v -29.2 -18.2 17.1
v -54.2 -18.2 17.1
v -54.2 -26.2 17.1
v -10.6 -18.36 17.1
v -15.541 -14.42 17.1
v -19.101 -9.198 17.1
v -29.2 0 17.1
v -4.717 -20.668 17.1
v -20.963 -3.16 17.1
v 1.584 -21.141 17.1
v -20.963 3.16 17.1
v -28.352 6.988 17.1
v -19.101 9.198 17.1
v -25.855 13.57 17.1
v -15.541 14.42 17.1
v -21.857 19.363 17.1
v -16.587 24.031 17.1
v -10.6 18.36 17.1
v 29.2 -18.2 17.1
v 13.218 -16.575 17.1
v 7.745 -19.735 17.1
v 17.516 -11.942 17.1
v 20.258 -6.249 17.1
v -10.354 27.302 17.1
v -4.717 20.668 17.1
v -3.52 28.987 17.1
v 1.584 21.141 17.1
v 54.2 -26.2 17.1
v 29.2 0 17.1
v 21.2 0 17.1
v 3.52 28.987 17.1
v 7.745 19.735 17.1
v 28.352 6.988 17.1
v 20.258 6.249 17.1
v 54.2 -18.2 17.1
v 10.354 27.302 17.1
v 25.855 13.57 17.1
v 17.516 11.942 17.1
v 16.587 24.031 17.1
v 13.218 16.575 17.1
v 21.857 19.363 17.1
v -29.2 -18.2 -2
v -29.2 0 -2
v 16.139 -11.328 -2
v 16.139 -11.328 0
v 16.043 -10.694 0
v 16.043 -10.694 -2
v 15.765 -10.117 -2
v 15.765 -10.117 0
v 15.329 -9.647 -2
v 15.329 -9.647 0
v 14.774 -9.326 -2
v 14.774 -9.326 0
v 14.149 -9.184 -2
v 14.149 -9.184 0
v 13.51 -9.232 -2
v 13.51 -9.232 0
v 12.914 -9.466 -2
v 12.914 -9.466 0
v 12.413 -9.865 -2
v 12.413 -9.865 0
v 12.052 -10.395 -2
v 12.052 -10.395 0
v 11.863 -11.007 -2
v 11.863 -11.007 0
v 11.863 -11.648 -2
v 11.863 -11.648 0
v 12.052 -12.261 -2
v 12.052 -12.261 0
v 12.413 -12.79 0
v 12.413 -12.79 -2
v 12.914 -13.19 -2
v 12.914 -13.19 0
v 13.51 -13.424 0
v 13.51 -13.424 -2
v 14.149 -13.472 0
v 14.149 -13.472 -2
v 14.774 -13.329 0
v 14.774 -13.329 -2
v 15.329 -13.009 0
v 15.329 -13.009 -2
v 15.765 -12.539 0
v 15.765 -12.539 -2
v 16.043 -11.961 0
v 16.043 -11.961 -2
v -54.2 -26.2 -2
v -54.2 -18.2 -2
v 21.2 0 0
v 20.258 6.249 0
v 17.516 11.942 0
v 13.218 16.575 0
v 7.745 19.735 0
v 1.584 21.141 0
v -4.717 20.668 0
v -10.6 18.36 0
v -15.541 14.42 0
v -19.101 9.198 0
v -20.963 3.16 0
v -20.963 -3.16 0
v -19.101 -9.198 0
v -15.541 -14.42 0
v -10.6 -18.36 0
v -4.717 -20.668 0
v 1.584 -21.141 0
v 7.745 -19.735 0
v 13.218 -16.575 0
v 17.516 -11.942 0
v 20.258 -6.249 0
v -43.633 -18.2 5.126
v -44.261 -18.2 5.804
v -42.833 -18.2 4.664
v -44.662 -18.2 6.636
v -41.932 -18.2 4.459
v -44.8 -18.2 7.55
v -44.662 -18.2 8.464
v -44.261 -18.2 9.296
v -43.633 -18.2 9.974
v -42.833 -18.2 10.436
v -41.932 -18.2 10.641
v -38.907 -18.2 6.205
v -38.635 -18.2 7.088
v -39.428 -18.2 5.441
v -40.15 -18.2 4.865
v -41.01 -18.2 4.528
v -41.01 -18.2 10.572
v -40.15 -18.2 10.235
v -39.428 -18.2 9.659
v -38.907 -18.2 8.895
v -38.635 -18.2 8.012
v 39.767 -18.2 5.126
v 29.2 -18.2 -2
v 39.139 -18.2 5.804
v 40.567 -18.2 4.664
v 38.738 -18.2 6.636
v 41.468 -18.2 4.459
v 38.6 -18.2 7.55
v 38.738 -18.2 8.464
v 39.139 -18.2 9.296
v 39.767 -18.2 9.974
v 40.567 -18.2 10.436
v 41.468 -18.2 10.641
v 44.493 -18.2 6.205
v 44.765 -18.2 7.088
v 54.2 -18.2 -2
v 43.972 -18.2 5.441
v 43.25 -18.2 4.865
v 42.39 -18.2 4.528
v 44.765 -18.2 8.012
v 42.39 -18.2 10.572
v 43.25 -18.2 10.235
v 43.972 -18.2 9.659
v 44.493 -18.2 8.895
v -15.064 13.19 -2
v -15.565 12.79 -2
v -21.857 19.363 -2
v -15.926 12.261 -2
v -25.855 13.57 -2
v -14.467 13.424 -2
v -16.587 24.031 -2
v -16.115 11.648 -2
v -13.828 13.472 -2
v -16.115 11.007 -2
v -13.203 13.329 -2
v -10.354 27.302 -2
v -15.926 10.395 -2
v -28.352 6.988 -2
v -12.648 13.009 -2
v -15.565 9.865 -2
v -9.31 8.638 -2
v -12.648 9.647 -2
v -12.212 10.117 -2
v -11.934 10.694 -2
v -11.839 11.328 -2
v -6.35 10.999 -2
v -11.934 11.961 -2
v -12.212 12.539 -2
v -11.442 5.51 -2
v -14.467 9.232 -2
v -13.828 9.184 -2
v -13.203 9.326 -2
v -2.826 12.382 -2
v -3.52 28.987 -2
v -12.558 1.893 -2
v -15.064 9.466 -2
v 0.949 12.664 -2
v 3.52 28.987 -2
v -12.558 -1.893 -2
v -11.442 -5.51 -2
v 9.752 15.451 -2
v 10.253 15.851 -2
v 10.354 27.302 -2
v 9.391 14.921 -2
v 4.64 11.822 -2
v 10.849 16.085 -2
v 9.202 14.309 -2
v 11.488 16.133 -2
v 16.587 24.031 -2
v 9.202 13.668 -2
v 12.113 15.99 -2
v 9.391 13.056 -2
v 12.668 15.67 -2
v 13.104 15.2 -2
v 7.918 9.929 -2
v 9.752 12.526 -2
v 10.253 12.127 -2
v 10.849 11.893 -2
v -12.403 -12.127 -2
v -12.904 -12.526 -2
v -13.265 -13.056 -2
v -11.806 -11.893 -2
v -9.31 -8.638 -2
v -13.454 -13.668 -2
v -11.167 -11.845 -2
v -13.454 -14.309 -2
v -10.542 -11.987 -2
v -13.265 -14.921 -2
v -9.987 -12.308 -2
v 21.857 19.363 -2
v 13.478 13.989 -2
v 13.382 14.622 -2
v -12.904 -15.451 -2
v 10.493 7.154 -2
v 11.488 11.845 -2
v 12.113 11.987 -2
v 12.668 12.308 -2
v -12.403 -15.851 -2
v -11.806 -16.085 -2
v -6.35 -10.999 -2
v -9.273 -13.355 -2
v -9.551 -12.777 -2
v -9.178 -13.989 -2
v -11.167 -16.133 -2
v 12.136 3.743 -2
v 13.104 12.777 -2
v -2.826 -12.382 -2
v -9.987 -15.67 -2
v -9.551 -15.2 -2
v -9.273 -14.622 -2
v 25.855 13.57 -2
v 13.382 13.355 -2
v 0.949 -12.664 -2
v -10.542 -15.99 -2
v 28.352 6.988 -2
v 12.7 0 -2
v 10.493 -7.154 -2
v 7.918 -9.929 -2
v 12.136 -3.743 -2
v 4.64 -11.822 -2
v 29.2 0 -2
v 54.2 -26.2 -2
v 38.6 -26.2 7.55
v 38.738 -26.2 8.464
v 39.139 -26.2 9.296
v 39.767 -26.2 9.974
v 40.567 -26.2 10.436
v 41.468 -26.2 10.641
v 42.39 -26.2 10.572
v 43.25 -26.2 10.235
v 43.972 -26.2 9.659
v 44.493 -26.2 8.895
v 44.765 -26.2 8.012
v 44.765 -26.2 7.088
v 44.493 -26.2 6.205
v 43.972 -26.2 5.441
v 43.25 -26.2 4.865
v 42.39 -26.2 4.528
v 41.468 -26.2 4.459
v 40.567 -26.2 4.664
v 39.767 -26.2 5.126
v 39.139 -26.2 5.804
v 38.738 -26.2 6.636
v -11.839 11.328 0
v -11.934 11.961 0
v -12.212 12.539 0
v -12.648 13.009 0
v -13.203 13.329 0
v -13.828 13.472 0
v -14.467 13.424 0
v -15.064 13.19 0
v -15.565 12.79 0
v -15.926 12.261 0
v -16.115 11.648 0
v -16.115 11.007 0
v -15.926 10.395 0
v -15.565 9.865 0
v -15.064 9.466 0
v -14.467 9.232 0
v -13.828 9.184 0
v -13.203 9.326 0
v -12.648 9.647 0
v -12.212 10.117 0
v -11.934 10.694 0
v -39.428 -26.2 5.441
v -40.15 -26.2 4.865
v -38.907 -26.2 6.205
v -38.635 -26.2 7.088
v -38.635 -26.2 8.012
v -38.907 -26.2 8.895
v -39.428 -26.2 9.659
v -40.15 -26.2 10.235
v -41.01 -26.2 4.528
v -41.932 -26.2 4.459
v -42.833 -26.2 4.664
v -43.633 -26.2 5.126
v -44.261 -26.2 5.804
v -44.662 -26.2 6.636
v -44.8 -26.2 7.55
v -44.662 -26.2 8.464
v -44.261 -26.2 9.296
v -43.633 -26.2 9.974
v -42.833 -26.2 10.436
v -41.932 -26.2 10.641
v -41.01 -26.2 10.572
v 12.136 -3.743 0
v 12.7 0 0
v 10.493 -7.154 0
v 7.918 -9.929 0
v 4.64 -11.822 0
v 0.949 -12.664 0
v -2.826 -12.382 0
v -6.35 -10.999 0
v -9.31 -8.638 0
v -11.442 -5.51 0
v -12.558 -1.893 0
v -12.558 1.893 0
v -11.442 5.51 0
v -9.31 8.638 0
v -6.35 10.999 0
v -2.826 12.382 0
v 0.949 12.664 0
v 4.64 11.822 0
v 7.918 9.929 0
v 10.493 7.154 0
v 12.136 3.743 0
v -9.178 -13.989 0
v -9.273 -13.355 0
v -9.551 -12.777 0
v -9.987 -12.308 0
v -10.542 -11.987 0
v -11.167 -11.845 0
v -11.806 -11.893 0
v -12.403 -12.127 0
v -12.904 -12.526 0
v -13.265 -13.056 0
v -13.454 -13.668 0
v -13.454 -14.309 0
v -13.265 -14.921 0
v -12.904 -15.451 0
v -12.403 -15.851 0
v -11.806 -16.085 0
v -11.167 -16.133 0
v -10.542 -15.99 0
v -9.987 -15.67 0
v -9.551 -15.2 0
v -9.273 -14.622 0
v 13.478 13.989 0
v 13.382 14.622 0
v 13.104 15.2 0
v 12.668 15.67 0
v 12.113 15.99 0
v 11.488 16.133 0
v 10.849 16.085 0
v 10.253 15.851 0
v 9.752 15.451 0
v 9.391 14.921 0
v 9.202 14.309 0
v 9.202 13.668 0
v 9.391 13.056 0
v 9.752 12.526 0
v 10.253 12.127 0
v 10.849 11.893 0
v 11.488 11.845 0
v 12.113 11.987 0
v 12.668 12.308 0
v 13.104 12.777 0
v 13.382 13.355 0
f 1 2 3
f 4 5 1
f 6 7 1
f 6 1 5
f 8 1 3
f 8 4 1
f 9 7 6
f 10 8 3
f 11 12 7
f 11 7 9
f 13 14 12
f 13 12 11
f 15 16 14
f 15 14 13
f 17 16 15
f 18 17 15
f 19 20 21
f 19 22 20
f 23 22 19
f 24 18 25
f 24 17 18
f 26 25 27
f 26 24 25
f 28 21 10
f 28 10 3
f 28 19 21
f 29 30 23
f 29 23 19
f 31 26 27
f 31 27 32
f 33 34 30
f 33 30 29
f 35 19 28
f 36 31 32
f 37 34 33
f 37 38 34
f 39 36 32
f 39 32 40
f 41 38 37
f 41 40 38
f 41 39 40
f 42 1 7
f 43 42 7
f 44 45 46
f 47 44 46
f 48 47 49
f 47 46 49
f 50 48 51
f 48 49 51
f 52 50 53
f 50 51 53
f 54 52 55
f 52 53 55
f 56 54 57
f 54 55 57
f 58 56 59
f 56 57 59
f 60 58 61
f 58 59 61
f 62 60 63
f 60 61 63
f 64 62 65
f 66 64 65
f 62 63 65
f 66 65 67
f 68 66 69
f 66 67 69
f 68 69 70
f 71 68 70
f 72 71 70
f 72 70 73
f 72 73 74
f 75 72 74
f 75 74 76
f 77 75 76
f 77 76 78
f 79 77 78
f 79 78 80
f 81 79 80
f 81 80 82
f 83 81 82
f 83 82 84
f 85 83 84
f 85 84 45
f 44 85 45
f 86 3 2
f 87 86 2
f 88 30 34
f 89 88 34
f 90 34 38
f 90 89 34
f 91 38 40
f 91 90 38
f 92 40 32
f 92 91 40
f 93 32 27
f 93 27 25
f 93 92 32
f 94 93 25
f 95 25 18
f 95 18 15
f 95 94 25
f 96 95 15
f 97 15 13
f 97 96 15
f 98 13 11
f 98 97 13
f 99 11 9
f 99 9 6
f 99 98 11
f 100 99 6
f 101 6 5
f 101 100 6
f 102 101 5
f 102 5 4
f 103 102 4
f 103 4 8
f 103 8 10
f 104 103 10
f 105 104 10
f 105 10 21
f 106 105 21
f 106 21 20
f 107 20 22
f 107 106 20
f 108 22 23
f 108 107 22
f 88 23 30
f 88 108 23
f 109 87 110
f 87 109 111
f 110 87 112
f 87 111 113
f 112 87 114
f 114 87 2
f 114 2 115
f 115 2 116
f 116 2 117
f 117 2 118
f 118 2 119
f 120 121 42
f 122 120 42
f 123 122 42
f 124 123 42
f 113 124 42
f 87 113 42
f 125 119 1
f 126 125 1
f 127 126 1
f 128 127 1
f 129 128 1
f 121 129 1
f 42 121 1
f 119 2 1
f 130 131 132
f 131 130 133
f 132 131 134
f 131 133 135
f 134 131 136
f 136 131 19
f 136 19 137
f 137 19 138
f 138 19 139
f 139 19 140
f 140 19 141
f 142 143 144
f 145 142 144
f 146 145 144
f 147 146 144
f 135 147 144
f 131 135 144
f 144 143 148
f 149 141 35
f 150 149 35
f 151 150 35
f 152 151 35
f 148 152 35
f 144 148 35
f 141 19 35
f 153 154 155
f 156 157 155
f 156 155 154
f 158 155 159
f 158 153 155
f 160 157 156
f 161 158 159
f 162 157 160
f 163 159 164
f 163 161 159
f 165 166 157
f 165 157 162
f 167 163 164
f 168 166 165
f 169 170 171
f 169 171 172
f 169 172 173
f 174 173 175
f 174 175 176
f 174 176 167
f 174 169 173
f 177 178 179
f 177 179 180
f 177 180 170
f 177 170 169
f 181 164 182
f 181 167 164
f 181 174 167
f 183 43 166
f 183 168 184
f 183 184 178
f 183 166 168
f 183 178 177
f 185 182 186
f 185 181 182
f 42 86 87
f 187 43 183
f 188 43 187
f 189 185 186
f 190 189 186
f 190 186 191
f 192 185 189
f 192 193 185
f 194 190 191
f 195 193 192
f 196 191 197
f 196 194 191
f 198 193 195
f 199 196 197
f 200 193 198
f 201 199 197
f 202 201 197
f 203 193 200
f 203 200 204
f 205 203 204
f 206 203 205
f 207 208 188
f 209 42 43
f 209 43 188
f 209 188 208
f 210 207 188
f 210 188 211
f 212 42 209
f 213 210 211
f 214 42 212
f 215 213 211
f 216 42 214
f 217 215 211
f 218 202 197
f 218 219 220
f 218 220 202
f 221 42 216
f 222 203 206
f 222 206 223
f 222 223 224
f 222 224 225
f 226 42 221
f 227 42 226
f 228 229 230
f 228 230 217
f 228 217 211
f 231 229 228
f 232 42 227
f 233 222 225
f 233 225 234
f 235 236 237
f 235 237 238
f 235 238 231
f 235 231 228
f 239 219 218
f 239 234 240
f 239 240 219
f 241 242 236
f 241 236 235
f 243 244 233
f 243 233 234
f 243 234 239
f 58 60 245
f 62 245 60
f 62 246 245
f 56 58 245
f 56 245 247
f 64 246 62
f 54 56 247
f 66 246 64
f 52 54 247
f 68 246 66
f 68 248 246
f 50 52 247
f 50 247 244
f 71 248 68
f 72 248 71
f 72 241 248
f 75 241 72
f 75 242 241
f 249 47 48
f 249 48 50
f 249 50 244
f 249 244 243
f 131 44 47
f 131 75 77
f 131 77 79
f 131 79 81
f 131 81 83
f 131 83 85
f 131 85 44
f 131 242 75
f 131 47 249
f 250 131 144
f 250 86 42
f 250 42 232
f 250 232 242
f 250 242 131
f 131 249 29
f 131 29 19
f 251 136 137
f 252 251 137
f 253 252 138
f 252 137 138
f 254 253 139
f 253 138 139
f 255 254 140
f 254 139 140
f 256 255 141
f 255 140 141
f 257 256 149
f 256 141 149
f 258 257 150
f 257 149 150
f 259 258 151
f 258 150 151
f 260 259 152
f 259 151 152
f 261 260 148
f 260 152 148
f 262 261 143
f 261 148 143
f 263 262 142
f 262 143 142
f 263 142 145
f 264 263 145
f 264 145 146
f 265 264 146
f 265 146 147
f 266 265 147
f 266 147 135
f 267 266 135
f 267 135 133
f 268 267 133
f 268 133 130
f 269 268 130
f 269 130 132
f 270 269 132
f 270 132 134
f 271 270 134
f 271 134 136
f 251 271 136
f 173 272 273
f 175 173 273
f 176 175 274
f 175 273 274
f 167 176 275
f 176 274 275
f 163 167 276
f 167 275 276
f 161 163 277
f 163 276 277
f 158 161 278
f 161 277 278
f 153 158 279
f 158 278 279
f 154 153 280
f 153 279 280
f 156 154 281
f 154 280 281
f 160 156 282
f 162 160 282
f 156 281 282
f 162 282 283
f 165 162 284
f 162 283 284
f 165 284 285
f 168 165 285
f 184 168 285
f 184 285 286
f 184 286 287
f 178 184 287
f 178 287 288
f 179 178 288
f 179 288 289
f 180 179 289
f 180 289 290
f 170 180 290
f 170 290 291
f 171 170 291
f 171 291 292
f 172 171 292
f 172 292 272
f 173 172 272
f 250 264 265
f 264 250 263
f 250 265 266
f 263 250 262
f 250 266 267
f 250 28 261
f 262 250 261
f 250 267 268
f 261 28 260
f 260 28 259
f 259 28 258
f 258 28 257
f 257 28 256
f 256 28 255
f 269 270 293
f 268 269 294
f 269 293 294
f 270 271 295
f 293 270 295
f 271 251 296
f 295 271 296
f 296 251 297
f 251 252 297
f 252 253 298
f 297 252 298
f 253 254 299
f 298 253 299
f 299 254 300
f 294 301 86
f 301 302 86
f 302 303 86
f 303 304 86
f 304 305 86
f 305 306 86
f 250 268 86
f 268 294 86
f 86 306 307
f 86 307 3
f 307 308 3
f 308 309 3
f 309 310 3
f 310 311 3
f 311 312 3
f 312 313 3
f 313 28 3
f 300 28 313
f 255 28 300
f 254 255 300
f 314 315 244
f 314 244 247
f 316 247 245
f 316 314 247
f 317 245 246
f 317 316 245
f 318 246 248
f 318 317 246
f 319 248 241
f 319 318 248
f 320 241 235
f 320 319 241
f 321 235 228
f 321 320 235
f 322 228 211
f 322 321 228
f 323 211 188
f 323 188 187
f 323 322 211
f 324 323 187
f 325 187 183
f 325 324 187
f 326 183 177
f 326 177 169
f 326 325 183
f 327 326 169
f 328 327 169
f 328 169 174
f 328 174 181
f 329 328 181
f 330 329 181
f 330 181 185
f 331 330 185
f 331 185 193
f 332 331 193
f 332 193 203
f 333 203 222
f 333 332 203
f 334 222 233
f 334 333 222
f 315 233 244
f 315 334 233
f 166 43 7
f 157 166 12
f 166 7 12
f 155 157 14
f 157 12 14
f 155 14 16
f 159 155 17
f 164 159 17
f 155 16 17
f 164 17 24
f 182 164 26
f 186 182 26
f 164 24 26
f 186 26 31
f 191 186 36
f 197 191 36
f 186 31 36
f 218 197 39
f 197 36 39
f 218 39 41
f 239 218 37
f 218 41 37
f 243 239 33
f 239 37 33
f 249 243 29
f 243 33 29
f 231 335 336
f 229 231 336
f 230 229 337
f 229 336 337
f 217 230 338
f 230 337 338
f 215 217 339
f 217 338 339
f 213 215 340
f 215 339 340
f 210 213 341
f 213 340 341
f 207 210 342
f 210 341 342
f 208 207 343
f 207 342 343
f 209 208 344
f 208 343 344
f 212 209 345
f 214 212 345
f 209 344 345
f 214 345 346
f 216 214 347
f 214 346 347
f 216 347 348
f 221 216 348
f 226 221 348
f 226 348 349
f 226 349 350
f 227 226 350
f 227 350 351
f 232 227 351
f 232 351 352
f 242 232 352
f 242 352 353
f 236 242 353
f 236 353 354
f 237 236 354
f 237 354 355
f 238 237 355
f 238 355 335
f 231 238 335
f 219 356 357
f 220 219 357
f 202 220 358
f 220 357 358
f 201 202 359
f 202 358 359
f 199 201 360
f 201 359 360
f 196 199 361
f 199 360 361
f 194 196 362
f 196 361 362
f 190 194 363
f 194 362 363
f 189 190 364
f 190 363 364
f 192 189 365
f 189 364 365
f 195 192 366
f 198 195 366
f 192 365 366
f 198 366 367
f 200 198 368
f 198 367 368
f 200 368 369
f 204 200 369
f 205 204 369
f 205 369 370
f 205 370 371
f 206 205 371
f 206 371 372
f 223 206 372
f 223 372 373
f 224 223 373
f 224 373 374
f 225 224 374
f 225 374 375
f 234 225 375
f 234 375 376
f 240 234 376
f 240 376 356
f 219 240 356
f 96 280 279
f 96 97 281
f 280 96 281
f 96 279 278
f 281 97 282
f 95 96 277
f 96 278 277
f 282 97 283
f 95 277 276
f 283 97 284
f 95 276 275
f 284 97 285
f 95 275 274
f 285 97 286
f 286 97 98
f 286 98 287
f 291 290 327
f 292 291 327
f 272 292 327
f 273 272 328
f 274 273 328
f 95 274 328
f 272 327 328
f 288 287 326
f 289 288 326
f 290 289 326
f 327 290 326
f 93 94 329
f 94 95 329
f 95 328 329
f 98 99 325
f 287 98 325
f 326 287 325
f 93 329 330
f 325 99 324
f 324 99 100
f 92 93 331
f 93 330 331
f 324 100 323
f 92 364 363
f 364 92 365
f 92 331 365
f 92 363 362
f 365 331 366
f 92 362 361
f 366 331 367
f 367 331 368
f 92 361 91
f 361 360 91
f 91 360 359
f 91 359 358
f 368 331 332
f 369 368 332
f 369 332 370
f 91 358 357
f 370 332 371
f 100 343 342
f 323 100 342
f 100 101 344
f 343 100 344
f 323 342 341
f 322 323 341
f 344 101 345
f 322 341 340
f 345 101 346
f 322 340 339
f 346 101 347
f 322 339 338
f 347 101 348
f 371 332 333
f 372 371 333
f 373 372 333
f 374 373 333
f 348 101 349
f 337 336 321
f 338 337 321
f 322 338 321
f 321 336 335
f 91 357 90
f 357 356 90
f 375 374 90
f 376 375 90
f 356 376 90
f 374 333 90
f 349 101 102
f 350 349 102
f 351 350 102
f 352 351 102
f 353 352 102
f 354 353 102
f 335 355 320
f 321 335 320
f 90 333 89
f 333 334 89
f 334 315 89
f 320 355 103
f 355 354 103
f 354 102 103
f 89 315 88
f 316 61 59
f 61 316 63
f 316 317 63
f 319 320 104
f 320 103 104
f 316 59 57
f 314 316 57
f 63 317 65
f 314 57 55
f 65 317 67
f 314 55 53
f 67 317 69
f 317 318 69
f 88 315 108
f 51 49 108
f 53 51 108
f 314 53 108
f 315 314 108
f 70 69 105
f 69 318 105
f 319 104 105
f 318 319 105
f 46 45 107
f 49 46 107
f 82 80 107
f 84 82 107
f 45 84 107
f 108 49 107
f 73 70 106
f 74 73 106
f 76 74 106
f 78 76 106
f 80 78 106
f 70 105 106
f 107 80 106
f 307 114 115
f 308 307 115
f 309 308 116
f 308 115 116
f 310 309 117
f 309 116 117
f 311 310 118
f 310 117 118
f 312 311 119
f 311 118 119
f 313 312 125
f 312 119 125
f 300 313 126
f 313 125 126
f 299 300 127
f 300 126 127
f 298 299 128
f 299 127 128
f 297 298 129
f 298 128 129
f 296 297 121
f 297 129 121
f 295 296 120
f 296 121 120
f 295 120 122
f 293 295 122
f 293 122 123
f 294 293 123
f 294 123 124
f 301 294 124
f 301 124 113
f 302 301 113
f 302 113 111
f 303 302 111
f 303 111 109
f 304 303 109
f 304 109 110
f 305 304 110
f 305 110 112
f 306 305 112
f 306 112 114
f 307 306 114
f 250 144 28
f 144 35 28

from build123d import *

# Parameters (mm, degrees)
F0_R     = 21.2
F1_DEPTH = 17.1
F2_R     = 12.7
F3_DEPTH = 2
F5_R     = 2.15
F6_DEPTH = 25
F7_R     = 3.1
F8_DEPTH = 8.001


with BuildPart() as f1:
    # F0 (on Top) → F1 (new body)
    with BuildSketch(Plane.XY):
        with BuildLine():
            Line((-54.2, -26.2), (54.2, -26.2))
            Line((54.2, -26.2), (54.2, -18.2))
            Line((54.2, -18.2), (29.2, -18.2))
            Line((29.2, -18.2), (29.2, 0))
            ThreePointArc((29.2, 0), (0, 29.2), (-29.2, 0))
            Line((-29.2, 0), (-29.2, -18.2))
            Line((-29.2, -18.2), (-54.2, -18.2))
            Line((-54.2, -18.2), (-54.2, -26.2))
        make_face()
        Circle(F0_R, mode=Mode.SUBTRACT)
    extrude(amount=F1_DEPTH)

    # F2 (on face) → F3 (join)
    with BuildSketch(Plane(origin=(0, 0, 0), x_dir=(1, 0, 0), z_dir=(0, 0, -1))):
        with BuildLine():
            Line((-29.2, 18.2), (-29.2, 0))
            ThreePointArc((-29.2, 0), (0, -29.2), (29.2, 0))
            Line((29.2, 0), (29.2, 18.2))
            Line((29.2, 18.2), (54.2, 18.2))
            Line((54.2, 18.2), (54.2, 26.2))
            Line((54.2, 26.2), (-54.2, 26.2))
            Line((-54.2, 26.2), (-54.2, 18.2))
            Line((-54.2, 18.2), (-29.2, 18.2))
        make_face()
        Circle(F2_R, mode=Mode.SUBTRACT)
    extrude(amount=F3_DEPTH)

    # F5 (on face) → F6 (cut)
    with BuildSketch(Plane.XY):
        with Locations((11.327767, 13.988627)):
            Circle(F5_R)
        with Locations((13.988627, -11.327767)):
            Circle(F5_R)
        with Locations((-11.327767, -13.988627)):
            Circle(F5_R)
        with Locations((-13.988627, 11.327767)):
            Circle(F5_R)
    extrude(amount=-F6_DEPTH, mode=Mode.SUBTRACT)

    # F7 (on face) → F8 (cut, through all)
    with BuildSketch(Plane(origin=(0, -18.2, 0), x_dir=(-1, 0, 0), z_dir=(0, 1, 0))):
        with Locations((41.7, 7.55)):
            Circle(F7_R)
        with Locations((-41.7, 7.55)):
            Circle(F7_R)
    extrude(amount=-F8_DEPTH, mode=Mode.SUBTRACT)


solid = f1.part
